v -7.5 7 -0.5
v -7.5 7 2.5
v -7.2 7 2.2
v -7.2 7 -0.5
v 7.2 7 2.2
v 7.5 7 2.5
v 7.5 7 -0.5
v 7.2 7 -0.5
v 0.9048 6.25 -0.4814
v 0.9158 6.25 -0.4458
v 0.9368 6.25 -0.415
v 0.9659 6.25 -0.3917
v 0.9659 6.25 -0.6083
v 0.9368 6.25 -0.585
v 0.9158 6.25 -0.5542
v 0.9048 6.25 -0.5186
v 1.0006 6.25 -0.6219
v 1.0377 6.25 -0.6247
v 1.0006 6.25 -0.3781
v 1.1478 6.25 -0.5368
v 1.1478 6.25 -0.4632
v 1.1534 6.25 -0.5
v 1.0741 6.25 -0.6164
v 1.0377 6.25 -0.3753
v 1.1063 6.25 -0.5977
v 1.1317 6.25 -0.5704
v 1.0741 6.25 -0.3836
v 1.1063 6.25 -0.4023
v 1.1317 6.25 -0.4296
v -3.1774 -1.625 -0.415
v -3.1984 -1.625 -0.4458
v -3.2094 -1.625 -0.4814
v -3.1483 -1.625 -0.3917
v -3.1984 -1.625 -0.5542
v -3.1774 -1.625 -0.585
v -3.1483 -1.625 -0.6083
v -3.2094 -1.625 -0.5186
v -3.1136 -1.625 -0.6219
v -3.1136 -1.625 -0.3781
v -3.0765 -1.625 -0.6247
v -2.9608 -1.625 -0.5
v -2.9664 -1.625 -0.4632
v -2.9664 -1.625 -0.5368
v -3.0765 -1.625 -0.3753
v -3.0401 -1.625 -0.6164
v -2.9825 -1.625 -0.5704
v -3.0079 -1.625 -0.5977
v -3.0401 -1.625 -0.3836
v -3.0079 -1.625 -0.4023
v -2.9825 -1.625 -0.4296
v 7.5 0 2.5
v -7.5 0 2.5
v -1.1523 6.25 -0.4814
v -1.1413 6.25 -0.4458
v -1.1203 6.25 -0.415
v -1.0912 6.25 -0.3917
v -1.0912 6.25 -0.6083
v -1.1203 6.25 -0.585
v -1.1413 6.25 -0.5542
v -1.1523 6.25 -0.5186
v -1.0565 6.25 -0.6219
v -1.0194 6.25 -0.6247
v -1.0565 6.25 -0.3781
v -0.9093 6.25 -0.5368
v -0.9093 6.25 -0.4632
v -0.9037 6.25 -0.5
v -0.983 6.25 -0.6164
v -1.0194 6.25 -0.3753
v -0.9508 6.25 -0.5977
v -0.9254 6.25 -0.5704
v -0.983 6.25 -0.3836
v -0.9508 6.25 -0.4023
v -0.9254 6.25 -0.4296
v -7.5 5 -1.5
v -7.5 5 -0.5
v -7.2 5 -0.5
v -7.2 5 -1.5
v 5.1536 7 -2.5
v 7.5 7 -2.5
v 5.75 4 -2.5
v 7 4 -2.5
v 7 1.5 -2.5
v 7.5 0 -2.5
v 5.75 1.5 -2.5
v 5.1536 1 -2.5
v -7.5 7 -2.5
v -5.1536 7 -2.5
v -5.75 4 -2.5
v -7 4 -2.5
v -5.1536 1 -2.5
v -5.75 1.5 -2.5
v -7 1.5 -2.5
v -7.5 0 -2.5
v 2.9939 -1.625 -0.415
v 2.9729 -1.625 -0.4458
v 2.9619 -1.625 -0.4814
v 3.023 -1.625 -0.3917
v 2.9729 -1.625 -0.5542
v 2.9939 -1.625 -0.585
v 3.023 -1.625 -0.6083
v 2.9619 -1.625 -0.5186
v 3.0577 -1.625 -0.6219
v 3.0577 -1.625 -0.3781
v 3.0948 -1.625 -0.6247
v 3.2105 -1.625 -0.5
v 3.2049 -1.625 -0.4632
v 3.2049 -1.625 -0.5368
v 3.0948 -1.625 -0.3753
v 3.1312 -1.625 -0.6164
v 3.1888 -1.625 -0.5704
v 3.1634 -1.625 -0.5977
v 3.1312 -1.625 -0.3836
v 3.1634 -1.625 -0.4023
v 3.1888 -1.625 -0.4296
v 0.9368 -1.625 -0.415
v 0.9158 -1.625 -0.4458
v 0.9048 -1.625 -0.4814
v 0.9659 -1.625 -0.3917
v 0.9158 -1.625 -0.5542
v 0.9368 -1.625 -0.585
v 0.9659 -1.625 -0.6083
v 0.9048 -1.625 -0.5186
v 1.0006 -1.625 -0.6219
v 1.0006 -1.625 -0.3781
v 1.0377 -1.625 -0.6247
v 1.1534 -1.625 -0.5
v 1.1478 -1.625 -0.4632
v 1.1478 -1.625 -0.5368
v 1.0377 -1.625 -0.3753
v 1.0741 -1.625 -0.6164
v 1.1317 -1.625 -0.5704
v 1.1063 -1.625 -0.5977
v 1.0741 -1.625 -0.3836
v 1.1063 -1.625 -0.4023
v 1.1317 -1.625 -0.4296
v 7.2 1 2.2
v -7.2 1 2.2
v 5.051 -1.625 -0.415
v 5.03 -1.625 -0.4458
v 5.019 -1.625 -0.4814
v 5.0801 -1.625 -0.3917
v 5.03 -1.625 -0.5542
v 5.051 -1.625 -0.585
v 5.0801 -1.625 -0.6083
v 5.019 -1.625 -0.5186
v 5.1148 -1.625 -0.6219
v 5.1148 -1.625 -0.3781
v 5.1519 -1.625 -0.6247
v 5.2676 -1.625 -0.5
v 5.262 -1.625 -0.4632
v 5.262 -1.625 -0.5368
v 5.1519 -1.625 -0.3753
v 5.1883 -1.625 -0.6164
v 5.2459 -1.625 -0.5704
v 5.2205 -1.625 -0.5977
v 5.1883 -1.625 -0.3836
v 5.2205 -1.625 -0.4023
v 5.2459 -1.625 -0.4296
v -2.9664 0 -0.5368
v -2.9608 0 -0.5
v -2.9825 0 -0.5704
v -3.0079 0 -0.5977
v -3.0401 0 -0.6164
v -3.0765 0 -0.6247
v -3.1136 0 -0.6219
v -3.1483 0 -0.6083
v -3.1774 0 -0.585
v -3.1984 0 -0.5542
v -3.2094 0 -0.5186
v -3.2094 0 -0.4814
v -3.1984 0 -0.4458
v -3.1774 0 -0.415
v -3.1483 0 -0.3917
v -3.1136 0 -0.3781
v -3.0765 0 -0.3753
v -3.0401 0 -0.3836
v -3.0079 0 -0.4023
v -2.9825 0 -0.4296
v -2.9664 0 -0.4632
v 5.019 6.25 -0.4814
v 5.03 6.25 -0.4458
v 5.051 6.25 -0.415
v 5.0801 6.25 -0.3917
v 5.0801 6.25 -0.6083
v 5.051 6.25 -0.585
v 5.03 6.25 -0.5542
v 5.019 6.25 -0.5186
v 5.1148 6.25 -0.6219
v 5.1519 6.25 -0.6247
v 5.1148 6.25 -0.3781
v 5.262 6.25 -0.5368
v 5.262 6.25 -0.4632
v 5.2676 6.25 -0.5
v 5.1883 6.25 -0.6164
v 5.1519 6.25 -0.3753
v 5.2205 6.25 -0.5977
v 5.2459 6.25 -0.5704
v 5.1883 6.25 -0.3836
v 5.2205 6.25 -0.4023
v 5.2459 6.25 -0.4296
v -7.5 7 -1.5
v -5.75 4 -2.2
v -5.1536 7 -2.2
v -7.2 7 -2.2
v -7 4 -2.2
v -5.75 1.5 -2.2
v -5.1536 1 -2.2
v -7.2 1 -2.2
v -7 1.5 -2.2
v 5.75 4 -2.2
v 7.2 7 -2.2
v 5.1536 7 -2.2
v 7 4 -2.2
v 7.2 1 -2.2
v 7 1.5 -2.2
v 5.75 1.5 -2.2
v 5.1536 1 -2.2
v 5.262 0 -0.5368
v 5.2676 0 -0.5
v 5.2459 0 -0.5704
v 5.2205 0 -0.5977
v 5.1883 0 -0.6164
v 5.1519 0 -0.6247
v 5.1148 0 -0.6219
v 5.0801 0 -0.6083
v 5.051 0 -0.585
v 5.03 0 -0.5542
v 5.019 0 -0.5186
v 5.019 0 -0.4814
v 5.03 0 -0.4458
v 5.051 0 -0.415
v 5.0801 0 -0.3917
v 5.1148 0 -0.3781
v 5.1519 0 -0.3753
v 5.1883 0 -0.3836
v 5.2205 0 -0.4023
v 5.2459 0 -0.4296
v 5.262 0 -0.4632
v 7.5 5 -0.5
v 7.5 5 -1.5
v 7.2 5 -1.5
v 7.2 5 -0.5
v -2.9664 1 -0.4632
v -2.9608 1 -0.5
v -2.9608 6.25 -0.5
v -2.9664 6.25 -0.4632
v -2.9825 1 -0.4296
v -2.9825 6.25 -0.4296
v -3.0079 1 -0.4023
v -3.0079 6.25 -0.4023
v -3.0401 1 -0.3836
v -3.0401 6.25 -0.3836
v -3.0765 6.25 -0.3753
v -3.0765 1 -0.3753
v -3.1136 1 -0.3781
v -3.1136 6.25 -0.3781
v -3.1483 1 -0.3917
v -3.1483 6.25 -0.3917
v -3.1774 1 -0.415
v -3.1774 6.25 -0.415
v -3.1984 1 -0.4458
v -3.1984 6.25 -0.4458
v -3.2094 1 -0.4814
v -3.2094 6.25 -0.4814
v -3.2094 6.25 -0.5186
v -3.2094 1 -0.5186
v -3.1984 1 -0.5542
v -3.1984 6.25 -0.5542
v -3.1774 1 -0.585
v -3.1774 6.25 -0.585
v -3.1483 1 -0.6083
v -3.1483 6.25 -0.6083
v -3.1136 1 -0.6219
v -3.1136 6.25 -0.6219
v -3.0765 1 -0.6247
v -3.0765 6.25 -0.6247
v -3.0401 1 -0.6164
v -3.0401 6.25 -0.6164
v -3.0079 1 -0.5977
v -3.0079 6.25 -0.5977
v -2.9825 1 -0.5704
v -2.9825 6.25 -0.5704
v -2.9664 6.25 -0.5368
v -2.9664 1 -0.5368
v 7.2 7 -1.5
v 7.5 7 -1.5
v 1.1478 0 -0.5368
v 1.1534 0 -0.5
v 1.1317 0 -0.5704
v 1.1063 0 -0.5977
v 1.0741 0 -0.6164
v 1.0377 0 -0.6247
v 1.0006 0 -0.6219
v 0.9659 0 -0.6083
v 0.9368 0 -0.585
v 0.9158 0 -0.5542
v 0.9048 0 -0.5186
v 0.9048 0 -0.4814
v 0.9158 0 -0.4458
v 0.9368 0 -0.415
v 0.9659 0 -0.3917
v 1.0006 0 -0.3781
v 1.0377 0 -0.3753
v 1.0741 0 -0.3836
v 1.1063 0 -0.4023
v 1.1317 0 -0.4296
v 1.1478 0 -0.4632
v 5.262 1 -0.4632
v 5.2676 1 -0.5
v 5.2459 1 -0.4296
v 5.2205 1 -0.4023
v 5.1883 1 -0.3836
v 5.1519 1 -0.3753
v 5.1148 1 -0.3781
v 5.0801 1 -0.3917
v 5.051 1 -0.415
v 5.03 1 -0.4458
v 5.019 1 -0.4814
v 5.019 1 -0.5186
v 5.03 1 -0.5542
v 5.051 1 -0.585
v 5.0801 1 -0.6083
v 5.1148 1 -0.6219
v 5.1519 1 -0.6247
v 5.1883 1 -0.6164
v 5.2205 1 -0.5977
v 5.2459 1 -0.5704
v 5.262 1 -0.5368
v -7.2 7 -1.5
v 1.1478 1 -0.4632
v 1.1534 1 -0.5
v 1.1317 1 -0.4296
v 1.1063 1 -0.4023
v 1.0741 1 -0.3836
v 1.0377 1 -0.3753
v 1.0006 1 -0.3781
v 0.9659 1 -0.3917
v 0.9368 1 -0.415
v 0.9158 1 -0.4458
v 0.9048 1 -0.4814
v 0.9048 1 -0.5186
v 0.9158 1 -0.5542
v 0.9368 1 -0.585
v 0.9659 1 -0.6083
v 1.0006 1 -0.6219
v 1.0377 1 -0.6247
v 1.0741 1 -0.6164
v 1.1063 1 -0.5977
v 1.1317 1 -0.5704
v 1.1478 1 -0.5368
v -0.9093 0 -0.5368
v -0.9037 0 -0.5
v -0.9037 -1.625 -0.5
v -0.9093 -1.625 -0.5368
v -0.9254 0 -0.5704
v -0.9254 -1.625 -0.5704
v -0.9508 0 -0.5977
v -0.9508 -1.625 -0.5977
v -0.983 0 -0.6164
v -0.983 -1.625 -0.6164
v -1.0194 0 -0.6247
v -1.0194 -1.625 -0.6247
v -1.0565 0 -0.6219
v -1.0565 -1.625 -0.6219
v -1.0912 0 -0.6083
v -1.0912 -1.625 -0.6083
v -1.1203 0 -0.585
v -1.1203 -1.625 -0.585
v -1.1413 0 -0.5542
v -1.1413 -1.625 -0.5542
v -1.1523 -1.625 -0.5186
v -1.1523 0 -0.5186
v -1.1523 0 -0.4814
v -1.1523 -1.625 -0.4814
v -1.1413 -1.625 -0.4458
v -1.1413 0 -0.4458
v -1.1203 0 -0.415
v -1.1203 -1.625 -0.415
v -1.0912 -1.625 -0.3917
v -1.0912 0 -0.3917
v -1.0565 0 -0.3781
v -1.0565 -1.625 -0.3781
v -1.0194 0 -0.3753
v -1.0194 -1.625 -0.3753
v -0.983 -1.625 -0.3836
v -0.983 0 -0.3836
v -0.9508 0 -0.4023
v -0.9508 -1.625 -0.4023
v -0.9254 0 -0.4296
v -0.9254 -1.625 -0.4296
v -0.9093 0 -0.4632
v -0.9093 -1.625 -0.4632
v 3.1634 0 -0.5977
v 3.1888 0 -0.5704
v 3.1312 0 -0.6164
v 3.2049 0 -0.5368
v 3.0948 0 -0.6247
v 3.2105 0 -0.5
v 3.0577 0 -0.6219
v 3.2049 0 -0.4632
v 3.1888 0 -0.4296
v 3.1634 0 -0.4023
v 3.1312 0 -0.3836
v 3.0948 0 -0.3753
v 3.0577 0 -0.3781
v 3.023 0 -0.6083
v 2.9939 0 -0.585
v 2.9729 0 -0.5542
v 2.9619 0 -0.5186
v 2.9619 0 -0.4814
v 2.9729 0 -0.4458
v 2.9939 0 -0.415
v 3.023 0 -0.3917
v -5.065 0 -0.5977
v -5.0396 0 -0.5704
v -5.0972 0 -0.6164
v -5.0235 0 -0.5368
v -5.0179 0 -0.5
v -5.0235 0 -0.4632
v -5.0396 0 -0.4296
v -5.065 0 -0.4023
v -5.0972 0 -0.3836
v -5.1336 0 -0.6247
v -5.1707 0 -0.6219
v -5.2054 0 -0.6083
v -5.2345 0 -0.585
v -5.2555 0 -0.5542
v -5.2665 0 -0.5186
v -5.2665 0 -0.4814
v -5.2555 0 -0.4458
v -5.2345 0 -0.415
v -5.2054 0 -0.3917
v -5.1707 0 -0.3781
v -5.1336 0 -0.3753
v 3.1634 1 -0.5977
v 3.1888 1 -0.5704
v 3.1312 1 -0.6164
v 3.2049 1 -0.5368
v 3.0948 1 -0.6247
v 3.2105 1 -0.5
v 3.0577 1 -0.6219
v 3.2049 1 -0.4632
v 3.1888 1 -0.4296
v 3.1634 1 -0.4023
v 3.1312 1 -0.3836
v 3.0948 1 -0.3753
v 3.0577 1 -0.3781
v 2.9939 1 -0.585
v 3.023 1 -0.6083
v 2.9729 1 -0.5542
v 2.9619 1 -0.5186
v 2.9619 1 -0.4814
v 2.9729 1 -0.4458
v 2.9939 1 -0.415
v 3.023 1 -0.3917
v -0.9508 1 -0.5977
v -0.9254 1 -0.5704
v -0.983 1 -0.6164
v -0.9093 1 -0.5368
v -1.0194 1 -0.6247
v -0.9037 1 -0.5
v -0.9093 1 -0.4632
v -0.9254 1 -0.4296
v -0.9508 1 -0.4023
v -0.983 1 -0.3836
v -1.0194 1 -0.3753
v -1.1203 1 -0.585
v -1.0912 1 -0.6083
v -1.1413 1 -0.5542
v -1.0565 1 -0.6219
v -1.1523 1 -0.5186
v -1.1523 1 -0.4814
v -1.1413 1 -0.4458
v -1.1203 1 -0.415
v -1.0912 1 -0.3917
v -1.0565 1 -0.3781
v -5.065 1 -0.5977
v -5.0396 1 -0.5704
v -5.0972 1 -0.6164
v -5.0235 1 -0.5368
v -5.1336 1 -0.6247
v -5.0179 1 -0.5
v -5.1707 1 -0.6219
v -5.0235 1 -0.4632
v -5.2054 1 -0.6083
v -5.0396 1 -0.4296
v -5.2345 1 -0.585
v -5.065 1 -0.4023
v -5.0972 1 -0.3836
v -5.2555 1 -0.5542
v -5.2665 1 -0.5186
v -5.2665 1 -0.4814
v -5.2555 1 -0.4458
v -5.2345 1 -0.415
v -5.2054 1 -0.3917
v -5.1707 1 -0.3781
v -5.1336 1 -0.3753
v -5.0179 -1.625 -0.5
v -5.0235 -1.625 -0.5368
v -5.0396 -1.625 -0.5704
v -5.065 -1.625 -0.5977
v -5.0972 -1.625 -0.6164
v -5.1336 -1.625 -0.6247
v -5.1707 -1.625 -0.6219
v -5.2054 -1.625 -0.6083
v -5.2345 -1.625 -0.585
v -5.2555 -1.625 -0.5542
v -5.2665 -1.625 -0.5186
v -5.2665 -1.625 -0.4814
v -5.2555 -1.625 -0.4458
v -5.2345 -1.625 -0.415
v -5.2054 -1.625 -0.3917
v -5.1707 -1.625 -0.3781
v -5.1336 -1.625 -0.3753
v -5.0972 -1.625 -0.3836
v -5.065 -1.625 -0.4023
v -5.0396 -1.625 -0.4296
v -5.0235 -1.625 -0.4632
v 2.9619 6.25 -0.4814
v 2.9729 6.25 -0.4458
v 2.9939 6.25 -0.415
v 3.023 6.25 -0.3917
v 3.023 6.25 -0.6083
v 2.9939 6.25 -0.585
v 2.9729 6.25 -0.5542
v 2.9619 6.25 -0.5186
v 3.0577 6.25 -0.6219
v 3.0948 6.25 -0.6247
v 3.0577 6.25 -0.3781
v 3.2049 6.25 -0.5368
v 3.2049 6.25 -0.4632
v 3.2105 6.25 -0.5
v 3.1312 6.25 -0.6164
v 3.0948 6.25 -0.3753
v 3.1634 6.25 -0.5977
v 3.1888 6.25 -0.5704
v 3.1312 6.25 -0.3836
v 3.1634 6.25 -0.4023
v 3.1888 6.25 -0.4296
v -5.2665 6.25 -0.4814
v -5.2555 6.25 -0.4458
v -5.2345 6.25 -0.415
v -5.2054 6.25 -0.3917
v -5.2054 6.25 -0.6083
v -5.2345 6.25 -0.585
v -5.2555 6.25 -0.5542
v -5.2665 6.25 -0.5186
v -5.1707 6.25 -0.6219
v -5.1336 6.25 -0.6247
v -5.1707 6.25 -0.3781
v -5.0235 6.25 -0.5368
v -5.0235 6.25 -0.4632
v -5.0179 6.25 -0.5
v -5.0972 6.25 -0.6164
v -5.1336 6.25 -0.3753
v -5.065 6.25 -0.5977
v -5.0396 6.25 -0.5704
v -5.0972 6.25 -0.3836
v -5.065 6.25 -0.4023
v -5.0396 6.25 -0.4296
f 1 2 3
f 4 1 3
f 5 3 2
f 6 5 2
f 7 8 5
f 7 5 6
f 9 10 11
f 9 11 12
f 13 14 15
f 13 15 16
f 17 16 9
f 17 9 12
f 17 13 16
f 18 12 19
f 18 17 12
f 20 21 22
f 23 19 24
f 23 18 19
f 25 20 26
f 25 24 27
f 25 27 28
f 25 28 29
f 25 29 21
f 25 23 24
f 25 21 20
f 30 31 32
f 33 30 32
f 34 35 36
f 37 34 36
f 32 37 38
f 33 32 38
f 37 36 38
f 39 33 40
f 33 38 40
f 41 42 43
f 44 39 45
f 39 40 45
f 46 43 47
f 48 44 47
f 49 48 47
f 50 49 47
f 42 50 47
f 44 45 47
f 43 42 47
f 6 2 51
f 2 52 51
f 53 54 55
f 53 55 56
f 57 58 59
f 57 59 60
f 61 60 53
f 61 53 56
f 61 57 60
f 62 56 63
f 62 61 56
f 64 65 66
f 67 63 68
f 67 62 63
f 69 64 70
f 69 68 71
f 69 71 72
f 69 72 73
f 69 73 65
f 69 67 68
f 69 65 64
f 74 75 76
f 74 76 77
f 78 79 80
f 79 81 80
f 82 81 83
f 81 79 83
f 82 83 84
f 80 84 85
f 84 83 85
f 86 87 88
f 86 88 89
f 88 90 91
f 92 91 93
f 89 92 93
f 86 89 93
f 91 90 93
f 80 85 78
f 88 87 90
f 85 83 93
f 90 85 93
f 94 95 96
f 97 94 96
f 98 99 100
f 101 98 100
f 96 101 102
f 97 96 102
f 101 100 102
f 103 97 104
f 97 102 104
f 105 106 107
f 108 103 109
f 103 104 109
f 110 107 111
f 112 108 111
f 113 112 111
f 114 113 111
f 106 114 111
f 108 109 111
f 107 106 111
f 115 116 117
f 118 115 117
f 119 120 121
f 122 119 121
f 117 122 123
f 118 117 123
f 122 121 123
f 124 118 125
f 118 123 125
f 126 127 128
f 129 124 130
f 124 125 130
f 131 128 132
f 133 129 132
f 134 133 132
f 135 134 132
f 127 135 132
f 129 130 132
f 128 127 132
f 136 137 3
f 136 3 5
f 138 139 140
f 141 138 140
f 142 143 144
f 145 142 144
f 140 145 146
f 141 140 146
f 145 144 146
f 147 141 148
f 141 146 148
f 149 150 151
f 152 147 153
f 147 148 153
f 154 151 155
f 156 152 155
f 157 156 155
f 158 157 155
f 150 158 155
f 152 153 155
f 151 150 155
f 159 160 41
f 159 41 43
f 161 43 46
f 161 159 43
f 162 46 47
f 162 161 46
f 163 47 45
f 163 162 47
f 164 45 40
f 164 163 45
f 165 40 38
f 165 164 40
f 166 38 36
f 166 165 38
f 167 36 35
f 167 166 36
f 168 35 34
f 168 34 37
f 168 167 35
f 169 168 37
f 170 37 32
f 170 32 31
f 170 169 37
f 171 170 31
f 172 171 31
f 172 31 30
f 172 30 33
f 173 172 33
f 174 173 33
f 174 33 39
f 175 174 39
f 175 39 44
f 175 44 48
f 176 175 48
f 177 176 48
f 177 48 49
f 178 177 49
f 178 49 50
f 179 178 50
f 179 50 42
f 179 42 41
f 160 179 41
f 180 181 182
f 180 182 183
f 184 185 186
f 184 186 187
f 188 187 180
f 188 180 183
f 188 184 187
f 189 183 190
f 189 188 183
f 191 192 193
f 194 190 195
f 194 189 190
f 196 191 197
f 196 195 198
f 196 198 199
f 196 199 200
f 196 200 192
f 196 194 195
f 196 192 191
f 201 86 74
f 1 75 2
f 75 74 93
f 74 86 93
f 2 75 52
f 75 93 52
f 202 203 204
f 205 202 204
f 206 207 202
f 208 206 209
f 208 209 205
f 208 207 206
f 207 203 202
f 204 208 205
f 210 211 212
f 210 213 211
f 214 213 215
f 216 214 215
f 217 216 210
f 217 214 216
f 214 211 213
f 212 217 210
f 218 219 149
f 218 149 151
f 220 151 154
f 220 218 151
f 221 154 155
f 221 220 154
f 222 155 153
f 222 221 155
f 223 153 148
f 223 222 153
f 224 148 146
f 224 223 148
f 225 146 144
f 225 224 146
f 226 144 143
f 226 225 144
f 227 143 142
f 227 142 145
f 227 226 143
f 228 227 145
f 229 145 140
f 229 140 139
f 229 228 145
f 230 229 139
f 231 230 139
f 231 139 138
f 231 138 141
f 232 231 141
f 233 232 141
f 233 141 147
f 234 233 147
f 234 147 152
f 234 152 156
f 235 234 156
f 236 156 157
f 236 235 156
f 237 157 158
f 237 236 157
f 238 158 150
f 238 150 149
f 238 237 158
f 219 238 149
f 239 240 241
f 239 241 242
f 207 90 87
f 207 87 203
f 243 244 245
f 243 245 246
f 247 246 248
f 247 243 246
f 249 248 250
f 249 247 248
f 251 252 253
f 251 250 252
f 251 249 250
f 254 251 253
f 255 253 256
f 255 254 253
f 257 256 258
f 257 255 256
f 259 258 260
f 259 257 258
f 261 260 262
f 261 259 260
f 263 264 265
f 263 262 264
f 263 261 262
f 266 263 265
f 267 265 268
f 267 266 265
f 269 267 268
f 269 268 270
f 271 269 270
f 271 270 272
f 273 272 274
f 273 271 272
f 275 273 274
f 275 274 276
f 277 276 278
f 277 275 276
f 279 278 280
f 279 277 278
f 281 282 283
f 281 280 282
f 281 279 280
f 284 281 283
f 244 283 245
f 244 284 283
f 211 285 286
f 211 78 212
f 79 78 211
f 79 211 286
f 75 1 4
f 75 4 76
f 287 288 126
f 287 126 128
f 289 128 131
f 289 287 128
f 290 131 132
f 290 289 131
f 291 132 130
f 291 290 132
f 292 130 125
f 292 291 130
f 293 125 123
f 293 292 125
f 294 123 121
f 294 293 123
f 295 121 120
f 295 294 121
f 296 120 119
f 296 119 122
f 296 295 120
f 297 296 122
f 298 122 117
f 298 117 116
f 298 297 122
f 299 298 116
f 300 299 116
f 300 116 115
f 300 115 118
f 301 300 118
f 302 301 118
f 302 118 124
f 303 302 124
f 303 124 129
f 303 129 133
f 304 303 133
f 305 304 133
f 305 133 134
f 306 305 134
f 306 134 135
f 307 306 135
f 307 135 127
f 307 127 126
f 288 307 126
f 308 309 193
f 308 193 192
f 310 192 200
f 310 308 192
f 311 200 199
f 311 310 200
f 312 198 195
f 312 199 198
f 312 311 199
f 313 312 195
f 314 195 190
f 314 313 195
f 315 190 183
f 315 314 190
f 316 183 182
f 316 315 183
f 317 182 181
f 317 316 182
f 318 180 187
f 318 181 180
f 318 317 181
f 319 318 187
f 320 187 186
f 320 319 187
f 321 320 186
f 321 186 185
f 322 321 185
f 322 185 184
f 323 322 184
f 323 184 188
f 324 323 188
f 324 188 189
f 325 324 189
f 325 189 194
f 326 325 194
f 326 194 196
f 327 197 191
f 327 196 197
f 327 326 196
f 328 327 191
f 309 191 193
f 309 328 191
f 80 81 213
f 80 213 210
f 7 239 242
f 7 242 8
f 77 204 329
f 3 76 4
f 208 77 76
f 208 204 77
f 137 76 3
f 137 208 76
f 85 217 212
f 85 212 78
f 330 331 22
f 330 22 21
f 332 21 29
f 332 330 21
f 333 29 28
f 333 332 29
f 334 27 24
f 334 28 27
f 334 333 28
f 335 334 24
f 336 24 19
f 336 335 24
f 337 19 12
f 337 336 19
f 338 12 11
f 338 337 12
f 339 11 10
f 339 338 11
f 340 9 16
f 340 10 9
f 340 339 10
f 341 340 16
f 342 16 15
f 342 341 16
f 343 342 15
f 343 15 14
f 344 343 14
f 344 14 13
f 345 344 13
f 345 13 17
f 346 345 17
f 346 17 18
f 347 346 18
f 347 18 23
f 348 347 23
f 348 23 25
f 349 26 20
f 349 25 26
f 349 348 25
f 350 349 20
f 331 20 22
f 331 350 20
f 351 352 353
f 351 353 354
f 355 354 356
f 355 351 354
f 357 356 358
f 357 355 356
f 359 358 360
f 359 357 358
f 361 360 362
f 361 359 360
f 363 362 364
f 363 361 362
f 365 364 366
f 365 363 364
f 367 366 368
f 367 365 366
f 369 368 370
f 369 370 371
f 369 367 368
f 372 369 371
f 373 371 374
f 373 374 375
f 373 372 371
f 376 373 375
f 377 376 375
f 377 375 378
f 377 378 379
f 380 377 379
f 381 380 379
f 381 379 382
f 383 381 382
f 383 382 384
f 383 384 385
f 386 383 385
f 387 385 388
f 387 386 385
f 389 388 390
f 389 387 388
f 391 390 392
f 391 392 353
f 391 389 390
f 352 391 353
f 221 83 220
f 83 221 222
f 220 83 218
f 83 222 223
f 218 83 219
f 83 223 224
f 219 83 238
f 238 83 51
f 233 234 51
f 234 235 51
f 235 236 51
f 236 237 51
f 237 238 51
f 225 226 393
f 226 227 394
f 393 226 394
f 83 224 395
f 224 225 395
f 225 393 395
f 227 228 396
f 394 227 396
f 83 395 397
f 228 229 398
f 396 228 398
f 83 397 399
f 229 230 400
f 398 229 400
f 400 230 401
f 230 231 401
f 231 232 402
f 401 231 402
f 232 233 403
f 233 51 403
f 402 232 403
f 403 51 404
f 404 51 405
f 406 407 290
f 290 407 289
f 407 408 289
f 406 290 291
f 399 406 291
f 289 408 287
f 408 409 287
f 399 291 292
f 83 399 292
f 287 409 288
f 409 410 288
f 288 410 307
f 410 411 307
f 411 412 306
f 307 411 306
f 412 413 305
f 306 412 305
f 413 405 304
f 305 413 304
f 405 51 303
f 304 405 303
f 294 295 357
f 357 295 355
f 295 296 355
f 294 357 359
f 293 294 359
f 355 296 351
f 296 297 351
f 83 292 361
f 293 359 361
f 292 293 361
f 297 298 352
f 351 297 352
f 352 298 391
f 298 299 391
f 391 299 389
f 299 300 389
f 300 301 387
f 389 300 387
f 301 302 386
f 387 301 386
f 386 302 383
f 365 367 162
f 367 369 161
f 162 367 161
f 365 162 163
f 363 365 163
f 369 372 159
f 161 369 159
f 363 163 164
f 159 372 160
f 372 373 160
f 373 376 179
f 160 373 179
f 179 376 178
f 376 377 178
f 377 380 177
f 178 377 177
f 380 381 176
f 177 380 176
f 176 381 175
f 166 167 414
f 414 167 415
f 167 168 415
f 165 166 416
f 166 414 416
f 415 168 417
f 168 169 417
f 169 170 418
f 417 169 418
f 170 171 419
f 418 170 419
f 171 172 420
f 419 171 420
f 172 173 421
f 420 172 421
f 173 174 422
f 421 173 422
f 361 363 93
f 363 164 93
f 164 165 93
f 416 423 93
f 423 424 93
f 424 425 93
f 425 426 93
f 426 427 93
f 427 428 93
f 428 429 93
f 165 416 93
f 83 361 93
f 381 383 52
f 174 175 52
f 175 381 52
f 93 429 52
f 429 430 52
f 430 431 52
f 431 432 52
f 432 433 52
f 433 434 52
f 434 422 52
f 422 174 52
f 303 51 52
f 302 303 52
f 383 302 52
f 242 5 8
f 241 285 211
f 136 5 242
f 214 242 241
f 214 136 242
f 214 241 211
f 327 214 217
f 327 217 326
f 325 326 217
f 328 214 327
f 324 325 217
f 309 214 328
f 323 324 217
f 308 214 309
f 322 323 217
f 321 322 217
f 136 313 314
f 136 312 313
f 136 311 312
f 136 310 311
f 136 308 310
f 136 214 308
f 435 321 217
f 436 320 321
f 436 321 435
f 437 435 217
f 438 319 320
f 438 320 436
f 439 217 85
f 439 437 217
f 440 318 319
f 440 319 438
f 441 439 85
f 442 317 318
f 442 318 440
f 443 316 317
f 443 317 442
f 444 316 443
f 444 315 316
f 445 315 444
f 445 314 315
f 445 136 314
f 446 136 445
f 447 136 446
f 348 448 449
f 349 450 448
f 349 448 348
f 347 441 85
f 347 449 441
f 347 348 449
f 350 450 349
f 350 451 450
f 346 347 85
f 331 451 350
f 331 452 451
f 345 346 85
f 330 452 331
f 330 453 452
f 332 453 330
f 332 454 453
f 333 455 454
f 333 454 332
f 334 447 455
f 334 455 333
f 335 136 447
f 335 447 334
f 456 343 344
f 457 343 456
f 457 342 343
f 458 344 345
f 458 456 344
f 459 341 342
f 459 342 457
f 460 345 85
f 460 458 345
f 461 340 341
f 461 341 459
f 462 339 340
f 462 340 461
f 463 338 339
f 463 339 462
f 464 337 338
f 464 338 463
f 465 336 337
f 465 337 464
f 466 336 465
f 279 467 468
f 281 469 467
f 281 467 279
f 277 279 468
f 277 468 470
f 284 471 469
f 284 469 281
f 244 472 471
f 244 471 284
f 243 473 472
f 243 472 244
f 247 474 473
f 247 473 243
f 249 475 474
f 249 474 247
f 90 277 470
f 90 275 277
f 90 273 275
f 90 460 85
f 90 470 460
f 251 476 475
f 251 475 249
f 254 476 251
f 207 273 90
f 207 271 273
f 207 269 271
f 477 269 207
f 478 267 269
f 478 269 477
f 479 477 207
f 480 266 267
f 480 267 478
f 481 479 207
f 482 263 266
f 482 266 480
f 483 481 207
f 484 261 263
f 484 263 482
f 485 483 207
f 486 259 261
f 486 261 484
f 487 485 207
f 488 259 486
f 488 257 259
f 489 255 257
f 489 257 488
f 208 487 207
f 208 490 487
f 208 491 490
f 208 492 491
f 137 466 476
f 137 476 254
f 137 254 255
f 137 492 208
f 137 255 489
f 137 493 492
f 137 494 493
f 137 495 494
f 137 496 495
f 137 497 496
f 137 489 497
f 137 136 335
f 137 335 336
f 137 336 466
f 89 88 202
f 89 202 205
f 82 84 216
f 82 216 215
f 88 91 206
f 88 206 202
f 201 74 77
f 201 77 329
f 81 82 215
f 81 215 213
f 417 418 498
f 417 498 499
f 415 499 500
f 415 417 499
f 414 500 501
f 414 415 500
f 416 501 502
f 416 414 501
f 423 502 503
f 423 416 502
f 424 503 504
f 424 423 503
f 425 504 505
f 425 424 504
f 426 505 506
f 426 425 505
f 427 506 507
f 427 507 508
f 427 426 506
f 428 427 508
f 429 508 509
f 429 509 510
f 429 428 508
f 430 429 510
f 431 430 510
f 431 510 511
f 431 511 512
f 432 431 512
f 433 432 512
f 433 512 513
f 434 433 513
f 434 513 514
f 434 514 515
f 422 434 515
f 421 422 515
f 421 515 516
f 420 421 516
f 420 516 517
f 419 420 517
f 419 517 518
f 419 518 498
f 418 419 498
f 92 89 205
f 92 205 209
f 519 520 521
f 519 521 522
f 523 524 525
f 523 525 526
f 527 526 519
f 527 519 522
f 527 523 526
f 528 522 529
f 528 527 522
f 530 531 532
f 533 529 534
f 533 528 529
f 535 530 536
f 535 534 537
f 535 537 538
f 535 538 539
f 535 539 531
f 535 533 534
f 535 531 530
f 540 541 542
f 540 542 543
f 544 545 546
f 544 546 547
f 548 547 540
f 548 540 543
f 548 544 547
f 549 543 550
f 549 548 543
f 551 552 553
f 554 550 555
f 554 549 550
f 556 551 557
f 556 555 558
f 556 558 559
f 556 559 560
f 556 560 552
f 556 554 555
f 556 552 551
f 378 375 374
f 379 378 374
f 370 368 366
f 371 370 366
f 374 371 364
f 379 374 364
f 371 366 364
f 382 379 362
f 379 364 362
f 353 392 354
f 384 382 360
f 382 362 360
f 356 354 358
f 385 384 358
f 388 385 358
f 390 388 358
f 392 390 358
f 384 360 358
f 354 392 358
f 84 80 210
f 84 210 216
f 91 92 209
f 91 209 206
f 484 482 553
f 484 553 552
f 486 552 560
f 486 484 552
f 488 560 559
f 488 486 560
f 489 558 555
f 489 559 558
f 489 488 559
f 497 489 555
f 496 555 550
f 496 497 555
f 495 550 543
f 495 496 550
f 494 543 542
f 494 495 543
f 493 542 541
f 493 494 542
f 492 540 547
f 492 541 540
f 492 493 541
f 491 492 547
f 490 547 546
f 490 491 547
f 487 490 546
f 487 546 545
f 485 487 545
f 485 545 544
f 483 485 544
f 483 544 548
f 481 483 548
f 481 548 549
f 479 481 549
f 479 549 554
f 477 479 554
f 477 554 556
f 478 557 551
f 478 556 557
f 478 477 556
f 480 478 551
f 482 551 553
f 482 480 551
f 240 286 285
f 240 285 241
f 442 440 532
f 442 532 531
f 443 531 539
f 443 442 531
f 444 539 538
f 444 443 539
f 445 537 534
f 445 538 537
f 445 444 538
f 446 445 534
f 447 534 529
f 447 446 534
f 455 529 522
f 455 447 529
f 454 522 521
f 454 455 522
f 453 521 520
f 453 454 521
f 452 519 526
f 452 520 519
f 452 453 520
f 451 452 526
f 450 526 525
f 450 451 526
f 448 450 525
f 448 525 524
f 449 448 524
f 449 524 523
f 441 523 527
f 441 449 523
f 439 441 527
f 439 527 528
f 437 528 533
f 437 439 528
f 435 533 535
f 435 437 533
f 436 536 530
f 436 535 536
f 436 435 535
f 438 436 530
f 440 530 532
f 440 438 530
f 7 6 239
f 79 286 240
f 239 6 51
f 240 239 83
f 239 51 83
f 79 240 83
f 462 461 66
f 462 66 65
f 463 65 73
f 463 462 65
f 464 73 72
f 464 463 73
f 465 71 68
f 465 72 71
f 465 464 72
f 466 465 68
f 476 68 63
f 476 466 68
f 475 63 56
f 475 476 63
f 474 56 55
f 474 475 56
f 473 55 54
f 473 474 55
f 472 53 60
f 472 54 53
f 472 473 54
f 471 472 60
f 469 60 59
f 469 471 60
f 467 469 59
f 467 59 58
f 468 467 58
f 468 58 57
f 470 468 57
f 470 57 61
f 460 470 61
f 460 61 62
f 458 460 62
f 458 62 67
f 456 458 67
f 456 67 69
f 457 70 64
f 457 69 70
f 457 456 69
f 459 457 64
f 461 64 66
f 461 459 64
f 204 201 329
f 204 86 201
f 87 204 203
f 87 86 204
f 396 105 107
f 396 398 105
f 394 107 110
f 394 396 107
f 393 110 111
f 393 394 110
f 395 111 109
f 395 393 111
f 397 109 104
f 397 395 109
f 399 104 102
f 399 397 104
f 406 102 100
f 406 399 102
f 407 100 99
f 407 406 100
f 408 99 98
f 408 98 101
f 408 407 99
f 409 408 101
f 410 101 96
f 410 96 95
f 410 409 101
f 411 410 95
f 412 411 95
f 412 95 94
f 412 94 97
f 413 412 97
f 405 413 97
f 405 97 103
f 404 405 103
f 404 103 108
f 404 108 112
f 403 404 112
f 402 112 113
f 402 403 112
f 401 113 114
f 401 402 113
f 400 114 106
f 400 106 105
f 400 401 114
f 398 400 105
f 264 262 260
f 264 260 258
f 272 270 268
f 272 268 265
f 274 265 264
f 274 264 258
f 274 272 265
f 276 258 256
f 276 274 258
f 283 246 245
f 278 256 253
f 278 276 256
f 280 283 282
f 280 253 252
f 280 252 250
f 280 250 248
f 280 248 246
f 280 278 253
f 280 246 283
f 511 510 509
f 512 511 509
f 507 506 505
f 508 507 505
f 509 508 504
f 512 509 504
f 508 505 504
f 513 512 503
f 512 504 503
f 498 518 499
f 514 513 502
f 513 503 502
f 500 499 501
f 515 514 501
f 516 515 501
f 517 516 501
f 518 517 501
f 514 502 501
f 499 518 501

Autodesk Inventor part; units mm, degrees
ref_plane "YZ Plane" through (0, 0, 0) normal (1, 0, 0) x (0, 1, 0)
ref_plane "XZ Plane" through (0, 0, 0) normal (0, 1, 0) x (-1, 0, 0)
ref_plane "XY Plane" through (0, 0, 0) normal (0, 0, 1) x (1, 0, 0)
sketch "Sketch1" plane through (0, 0, 0) normal (0, 1, 0) x (-1, 0, 0)
  line L0 (-7.5, -2.5) -> (7.5, -2.5)
  line L1 (7.5, -2.5) -> (7.5, 2.5)
  line L2 (7.5, 2.5) -> (-7.5, 2.5)
  line L3 (-7.5, 2.5) -> (-7.5, -2.5)
  line L4 (-7.5, -2.5) -> (7.5, 2.5) construction
  line L5 (7.5, -2.5) -> (-7.5, 2.5) construction
  point P0 (0, 0)
  dimension "d0" = 15
  dimension "d1" = 5
extrude "Extrusion1" add sketch "Sketch1" along normal blind 1
sketch "Sketch2" plane through (0, 1, 0) normal (0, 1, 0) x (1, 0, 0)
  line L0 (7.5, 2.5) -> (-7.5, 2.5) projected
  line L1 (-7.5, 2.5) -> (-7.5, -2.5) projected
  line L2 (-7.5, -2.5) -> (7.5, -2.5) projected
  line L3 (7.5, -2.5) -> (7.5, 2.5) projected
  line L4 (-5.1536, 2.5) -> (-5.1536, 2.2)
  line L5 (-5.1536, 2.2) -> (-7.2, 2.2)
  line L6 (-7.2, 2.2) -> (-7.2, -2.2)
  line L7 (-7.2, -2.2) -> (0, -2.2)
  line L8 (0, -2.2) -> (0, -2.5)
  line L9 (7.5, 2.5) -> (-7.5, 2.5) projected
  line L10 (-5.1536, 2.5) -> (-7.5, 2.5)
  line L11 (-7.5, 2.5) -> (-7.5, -2.5)
  point P0 (0, 0)
  dimension "d4" = 0.3
  dimension "d5" = 0.3
  dimension "d6" = 0.3
extrude "Extrusion2" add sketch "Sketch2" along normal blind 6 contours L4 L5 L6 L7 L8 L2 L1 L0
mirror "Mirror1" about plane through (0, 0, 0) normal (1, 0, 0) of "Extrusion2"
sketch "Sketch3" plane through (7.5, 0, -2.5) normal (0, 0, -1) x (-1, 0, 0)
  line L0 (0, 0) -> (15, 0) projected
  line L1 (15, 0) -> (15, 7) projected
  line L2 (12.6536, 7) -> (15, 7) projected
  line L3 (12.6536, 1) -> (12.6536, 7) projected
  line L4 (2.3464, 1) -> (12.6536, 1) projected
  line L5 (2.3464, 1) -> (2.3464, 7) projected
  line L6 (2.3464, 7) -> (0, 7) projected
  line L7 (0, 0) -> (0, 7) projected
  line L8 (14.5, 1.5) -> (13.25, 1.5)
  line L9 (13.25, 1.5) -> (13.25, 4)
  line L10 (13.25, 4) -> (14.5, 4)
  line L11 (14.5, 4) -> (14.5, 1.5)
  line L12 (14.5, 1.5) -> (13.25, 4) construction
  line L13 (13.25, 1.5) -> (14.5, 4) construction
  point P0 (7.5, 0)
  point P1 (13.875, 2.75)
  dimension "d9" = 1.25
  dimension "d10" = 2.5
  dimension "d11" = 0.5
  dimension "d12" = 0.5
extrude "Extrusion3" cut sketch "Sketch3" against normal up to surface (0.3 mm away) contours L8 L9 L10 L11
mirror "Mirror2" about plane through (0, 0, 0) normal (1, 0, 0) of "Extrusion3"
sketch "Sketch4" plane through (0, 1, 0) normal (0, 1, 0) x (1, 0, 0)
  line L0 (0, 0) -> (-21.8742, 0)
  circle A0 centre (-5.1429, 0.5) radius 0.125
  line L1 (7.2, -2.2) -> (7.2, 2.2) projected
  line L2 (-7.2, -2.2) -> (-7.2, 2.2) projected
  dimension "d15" = 0.25
  dimension "d16" = 0.5
  dimension "d17" = 14.4
  dimension "d18" = 2.0571
extrude "Extrusion4" add sketch "Sketch4" along normal blind 5.25 and the other way blind 2.625
pattern_linear "Rectangular Pattern1" count 6 spacing 2.0571 along (1, 0, 0) of "Extrusion4"
sketch "Sketch5" plane through (-7.5, 0, -2.5) normal (-1, 0, 0) x (0, 0, 1)
  line L0 (0, 0) -> (5, 0) projected
  line L1 (5, 0) -> (5, 7) projected
  line L2 (0, 7) -> (5, 7) projected
  line L3 (0, 0) -> (0, 7) projected
  line L4 (1, 7) -> (2, 7)
  line L5 (2, 7) -> (2, 5)
  line L6 (2, 5) -> (1, 5)
  line L7 (1, 5) -> (1, 7)
  point P0 (2.5, 0)
  dimension "d26" = 1
  dimension "d27" = 2
  dimension "d28" = 1
extrude "Extrusion5" cut sketch "Sketch5" against normal up to surface (0.3 mm away) contours L2 L5 L6 L7
mirror "Mirror3" about plane through (0, 0, 0) normal (1, 0, 0) of "Extrusion5"
equation "\"d5\" = d4"
equation "\"d6\" = d5"
equation "\"d12\" = d11"
equation "\"d18\" = 0.142857 * d17"
equation "\"d23\" = 0.142857 * d17"
equation "\"d28\" = d26"
